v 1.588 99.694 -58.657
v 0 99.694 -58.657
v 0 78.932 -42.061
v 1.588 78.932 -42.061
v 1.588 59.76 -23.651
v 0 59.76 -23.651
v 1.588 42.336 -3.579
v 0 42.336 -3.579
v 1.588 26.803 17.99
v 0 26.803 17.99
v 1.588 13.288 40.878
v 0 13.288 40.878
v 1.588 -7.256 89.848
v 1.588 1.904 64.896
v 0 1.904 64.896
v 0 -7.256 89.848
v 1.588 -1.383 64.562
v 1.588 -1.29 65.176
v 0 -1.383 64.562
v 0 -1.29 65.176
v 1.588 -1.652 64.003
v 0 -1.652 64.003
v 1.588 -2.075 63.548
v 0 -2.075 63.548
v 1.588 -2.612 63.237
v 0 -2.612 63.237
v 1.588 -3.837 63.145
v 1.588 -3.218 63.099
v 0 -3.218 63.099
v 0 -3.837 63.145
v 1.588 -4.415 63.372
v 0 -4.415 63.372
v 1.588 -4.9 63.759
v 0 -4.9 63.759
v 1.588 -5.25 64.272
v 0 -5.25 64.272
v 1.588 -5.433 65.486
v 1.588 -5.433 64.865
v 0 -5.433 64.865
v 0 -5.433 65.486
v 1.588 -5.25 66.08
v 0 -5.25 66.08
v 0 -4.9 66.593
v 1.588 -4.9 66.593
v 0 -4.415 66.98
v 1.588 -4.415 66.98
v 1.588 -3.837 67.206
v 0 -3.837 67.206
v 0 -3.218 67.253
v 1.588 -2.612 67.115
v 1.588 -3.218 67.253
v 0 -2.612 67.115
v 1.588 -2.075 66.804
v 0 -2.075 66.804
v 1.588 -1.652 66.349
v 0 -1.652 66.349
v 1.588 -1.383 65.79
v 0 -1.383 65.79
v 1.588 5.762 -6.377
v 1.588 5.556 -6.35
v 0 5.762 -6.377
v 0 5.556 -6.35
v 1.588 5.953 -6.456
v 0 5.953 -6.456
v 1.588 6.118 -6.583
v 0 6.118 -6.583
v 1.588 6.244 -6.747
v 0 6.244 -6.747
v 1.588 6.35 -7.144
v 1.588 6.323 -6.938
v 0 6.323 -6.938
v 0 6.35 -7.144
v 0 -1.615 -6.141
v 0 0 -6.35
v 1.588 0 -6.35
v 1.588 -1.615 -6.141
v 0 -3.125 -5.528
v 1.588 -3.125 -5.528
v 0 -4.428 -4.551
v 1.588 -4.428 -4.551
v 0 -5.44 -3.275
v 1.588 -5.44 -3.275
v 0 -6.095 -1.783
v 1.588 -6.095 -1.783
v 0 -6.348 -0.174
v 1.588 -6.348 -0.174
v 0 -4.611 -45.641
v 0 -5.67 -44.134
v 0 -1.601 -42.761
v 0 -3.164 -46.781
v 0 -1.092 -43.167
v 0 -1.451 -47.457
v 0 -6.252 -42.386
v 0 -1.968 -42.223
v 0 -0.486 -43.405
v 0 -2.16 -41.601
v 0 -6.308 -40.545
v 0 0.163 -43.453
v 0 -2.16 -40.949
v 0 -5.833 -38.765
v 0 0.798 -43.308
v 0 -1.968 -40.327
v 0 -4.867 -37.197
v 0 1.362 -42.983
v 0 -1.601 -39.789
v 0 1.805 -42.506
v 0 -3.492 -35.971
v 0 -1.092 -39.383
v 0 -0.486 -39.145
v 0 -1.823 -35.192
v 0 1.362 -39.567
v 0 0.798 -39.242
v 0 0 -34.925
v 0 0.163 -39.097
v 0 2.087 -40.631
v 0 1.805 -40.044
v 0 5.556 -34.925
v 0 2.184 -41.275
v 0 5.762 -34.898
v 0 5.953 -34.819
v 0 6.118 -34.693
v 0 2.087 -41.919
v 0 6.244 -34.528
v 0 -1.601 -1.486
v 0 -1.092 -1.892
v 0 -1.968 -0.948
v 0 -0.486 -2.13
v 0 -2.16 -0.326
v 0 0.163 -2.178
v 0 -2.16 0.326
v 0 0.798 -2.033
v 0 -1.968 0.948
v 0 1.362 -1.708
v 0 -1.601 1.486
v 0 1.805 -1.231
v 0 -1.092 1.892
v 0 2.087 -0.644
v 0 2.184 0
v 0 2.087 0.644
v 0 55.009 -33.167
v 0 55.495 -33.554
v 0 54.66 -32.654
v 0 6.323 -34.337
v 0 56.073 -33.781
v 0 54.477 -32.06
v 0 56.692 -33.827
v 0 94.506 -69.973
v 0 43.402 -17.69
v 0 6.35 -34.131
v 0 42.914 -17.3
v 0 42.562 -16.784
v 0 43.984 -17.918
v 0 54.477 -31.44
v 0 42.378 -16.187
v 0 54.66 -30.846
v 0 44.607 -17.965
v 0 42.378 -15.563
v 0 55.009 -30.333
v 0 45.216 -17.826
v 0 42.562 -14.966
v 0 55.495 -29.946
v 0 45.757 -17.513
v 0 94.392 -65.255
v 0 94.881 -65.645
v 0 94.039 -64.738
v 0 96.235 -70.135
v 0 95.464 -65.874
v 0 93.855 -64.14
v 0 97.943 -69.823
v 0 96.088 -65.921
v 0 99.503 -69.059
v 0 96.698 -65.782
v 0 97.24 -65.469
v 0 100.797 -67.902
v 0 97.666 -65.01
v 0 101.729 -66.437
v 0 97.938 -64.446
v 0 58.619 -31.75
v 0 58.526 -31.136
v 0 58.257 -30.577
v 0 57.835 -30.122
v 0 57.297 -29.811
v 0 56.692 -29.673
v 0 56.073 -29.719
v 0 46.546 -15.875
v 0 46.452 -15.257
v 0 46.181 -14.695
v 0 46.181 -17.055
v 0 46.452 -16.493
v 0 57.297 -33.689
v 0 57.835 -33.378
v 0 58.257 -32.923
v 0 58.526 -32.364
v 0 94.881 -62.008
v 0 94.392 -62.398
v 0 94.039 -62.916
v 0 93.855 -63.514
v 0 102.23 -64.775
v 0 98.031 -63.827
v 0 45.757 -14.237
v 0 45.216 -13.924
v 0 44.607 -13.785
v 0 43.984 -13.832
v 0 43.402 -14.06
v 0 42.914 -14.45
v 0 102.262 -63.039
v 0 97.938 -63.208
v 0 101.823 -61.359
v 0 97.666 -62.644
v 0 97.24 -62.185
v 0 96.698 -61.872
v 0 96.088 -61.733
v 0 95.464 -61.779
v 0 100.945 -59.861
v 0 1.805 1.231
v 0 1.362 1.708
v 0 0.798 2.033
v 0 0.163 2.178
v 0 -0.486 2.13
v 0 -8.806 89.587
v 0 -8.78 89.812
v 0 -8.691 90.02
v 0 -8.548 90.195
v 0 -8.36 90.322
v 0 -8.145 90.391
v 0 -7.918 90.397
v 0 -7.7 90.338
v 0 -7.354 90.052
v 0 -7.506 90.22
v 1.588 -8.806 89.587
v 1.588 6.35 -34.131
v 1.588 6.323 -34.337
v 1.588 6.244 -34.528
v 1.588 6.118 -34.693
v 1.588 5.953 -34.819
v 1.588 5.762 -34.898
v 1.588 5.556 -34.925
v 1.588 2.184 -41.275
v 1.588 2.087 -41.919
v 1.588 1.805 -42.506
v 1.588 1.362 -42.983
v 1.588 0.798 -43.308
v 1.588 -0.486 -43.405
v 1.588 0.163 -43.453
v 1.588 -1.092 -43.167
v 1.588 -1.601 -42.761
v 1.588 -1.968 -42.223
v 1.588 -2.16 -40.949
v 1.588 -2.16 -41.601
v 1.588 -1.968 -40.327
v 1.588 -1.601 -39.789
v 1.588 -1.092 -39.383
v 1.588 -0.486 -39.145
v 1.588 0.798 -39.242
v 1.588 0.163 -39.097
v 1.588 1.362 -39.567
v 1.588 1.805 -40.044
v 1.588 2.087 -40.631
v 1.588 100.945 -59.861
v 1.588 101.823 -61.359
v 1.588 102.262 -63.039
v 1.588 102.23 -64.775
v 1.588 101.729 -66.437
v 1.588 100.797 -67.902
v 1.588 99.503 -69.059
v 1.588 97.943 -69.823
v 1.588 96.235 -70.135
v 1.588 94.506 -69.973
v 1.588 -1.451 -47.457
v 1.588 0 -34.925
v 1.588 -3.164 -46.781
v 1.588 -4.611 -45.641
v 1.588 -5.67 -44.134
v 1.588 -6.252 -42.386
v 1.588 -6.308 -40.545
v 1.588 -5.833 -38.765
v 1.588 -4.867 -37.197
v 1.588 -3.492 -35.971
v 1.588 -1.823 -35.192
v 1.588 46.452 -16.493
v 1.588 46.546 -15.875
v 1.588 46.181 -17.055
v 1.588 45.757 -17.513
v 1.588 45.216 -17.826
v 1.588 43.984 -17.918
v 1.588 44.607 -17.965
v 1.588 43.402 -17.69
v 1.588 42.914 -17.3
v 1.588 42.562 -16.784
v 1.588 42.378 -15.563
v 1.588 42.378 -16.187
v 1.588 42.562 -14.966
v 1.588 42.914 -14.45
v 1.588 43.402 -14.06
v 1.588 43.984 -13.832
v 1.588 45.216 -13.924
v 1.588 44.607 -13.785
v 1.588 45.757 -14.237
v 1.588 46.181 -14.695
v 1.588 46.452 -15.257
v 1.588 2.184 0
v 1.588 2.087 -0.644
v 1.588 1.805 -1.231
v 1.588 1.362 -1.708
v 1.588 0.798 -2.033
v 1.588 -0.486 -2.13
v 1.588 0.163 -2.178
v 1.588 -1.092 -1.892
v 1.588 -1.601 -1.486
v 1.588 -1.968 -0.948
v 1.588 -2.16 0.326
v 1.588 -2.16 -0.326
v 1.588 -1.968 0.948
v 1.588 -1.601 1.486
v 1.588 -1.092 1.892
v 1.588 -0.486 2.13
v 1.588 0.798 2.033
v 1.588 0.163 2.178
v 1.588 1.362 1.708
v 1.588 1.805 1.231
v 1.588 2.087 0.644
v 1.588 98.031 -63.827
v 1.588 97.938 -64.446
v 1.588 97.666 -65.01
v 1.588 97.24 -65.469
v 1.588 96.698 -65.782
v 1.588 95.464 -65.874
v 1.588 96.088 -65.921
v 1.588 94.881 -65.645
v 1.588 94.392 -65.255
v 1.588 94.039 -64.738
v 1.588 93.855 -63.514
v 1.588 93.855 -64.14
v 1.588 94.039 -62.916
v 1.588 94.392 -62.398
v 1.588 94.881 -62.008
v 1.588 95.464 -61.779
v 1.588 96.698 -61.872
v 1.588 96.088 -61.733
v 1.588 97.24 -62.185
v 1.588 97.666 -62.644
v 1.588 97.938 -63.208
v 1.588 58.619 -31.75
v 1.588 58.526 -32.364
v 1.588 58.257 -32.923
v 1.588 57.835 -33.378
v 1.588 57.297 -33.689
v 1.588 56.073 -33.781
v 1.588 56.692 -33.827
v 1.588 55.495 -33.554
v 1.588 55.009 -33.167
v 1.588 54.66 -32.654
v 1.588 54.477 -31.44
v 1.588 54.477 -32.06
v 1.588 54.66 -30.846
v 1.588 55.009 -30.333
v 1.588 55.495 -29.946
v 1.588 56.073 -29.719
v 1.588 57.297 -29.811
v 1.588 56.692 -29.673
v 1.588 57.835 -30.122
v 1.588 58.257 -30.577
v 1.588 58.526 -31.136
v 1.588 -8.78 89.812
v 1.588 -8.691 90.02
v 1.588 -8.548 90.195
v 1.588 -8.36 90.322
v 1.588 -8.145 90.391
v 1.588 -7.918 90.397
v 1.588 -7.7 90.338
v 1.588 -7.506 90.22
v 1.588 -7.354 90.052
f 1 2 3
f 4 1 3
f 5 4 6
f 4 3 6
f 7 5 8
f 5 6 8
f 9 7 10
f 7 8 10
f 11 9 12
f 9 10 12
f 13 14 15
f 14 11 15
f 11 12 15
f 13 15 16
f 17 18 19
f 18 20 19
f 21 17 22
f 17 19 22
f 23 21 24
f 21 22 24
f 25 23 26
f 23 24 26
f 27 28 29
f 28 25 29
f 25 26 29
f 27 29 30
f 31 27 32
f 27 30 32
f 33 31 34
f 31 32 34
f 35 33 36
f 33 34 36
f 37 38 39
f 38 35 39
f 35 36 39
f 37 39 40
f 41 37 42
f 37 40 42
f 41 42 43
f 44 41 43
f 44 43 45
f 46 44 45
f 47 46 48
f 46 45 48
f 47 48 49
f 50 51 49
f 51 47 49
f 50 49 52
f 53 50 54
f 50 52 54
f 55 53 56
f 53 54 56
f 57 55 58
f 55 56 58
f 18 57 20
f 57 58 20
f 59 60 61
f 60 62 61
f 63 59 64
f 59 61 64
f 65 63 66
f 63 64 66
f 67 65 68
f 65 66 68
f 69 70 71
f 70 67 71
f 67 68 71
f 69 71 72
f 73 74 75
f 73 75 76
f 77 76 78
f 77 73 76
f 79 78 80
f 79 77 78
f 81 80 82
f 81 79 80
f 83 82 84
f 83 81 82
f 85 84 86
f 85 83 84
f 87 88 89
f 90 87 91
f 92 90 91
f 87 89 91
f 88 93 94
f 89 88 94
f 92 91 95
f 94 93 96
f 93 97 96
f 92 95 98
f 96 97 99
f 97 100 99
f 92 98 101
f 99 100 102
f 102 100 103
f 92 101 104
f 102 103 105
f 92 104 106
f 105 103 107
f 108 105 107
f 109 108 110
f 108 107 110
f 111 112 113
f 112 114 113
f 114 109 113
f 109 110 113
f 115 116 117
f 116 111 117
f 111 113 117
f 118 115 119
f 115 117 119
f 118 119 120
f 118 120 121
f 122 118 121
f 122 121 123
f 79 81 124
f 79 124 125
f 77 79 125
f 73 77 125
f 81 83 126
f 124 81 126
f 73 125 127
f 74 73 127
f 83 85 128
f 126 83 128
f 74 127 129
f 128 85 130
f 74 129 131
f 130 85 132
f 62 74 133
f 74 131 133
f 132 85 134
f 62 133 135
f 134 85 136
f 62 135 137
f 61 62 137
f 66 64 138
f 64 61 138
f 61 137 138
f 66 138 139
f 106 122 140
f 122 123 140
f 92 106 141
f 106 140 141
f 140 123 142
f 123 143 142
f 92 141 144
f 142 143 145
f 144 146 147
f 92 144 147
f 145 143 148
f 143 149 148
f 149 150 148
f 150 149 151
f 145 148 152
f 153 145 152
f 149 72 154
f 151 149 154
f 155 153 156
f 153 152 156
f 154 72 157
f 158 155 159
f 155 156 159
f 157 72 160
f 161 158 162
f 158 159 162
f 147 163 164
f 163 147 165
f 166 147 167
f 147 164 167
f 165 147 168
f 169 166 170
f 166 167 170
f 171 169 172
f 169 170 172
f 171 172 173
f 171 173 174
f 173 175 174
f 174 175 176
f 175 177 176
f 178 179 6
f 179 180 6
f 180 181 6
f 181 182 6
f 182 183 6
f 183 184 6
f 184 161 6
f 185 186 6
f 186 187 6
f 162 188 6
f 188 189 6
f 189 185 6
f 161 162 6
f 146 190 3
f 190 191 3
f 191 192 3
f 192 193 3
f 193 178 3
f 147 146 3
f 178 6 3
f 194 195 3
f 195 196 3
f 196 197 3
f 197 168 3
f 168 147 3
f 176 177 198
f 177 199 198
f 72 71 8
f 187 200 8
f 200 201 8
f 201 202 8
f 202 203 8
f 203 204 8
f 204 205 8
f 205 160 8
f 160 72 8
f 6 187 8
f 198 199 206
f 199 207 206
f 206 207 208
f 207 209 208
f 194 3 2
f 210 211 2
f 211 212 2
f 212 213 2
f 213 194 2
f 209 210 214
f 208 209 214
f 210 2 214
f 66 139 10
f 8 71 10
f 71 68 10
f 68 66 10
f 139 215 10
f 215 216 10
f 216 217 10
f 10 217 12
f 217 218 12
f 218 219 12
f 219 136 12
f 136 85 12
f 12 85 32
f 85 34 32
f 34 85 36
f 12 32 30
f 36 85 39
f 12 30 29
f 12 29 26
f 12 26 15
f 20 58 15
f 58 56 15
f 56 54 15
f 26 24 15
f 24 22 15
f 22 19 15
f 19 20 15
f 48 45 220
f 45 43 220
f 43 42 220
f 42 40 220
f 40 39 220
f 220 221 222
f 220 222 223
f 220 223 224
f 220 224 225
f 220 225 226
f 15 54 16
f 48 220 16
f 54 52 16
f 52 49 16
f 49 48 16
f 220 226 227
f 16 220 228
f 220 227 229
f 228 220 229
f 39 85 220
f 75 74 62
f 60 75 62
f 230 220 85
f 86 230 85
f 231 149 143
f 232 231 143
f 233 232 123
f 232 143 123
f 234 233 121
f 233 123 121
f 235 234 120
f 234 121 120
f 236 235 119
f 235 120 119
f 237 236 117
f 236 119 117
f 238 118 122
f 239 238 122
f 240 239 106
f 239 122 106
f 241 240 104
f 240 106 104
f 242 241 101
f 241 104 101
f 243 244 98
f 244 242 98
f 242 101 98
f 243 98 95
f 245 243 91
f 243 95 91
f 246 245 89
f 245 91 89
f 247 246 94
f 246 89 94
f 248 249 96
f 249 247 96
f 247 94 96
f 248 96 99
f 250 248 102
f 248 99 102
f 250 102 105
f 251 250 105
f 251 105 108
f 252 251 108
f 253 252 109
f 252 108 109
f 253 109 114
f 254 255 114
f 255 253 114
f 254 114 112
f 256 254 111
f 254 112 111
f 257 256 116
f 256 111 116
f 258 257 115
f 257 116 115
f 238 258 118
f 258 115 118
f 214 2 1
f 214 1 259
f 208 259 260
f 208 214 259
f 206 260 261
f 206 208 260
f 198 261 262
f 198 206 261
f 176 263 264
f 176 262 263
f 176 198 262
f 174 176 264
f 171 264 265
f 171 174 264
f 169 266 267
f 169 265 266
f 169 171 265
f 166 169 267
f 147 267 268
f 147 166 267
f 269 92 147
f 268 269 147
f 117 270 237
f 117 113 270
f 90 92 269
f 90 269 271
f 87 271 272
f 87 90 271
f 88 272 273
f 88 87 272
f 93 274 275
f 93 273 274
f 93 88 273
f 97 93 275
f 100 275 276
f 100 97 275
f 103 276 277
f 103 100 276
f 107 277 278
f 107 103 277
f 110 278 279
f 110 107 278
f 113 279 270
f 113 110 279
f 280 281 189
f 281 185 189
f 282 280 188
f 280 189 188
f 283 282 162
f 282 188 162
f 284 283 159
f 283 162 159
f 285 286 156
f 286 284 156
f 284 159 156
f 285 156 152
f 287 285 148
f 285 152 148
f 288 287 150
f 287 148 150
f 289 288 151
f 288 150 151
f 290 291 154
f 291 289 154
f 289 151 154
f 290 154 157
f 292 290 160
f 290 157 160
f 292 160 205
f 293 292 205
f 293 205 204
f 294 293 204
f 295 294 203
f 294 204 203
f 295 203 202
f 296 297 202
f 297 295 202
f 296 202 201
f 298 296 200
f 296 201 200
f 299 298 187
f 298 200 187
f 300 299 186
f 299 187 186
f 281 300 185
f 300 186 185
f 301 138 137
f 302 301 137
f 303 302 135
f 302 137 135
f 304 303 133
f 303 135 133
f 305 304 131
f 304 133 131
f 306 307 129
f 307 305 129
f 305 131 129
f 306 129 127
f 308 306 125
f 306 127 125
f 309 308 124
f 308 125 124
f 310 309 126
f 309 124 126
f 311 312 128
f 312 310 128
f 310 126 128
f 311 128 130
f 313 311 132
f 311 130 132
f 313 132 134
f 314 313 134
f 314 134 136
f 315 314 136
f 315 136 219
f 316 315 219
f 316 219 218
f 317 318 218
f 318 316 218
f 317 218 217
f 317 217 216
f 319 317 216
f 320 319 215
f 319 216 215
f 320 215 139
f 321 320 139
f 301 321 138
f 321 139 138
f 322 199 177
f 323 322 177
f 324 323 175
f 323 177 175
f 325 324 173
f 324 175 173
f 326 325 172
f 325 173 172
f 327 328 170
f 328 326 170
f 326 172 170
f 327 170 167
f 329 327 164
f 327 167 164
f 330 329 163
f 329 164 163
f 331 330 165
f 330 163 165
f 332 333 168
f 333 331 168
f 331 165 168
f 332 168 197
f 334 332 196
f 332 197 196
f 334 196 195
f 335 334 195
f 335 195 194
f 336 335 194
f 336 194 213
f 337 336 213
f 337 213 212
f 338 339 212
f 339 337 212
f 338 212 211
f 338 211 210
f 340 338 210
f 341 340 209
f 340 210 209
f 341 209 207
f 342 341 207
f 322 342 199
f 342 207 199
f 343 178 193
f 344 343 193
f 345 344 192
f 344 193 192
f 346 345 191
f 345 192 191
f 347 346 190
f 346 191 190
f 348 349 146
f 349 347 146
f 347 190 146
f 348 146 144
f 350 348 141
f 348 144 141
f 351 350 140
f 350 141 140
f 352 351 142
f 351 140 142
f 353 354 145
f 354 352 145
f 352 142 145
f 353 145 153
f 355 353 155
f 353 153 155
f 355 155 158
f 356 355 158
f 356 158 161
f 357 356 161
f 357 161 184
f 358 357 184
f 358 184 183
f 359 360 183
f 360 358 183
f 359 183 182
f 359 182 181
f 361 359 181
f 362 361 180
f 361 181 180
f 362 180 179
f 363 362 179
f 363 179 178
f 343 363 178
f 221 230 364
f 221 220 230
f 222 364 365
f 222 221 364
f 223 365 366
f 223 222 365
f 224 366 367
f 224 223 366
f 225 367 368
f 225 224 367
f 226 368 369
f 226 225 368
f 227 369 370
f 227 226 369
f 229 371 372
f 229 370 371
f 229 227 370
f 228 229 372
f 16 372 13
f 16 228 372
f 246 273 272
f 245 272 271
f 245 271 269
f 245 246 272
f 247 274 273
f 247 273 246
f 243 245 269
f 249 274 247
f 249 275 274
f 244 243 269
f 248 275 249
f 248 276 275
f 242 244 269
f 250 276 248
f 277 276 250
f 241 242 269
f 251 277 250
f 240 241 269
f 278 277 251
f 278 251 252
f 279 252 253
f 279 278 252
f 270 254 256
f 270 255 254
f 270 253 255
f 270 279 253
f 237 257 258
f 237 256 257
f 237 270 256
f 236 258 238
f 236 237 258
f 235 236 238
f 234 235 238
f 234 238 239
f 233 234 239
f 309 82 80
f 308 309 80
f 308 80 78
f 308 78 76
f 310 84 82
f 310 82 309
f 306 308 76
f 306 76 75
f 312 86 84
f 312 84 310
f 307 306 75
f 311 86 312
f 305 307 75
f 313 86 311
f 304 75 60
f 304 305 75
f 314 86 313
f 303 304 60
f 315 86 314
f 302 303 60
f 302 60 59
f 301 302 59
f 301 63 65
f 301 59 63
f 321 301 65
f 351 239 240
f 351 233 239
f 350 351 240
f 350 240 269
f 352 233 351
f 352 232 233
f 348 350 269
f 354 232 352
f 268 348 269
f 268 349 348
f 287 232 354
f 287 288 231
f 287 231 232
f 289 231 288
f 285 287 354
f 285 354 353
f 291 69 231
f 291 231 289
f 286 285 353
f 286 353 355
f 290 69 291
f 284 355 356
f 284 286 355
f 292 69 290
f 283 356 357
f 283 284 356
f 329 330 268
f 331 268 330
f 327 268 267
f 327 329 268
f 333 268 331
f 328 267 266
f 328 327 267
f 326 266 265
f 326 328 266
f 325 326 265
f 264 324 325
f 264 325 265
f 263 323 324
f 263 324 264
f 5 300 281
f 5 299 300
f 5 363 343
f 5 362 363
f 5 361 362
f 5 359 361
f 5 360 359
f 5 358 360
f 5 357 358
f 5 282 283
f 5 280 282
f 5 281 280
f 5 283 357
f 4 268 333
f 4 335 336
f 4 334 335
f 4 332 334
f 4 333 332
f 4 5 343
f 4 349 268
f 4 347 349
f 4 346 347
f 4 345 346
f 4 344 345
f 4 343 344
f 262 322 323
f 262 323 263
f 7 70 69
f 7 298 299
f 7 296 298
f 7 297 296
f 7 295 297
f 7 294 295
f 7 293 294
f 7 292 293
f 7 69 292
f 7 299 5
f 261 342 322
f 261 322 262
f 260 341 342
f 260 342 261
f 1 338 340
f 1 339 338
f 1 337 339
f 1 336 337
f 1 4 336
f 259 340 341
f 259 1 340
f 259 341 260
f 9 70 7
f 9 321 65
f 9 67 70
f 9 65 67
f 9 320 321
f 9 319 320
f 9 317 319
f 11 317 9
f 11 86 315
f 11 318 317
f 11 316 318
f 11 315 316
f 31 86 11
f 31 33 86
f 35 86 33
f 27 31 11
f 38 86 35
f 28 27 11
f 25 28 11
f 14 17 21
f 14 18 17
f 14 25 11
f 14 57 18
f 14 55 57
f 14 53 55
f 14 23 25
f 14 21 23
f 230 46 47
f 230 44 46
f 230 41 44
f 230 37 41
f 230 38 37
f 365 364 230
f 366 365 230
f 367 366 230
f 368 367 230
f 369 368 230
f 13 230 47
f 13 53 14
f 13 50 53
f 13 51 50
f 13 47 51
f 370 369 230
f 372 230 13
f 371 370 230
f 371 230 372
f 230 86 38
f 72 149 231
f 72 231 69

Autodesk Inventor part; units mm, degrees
ref_plane "YZ Plane" through (0, 0, 0) normal (1, 0, 0) x (0, 1, 0)
ref_plane "XZ Plane" through (0, 0, 0) normal (0, 1, 0) x (-1, 0, 0)
ref_plane "XY Plane" through (0, 0, 0) normal (0, 0, 1) x (1, 0, 0)
sketch "main" plane through (0, 0, 0) normal (0, 0, 1) x (1, 0, 0)
  circle A0 centre (-191.7635, 49.9495) radius 2.1844
  circle A1 centre (-95.8324, -13.8772) radius 2.1
  arc A2 (-99.5462, -18.9735) -> (-92.0695, -8.7075) centre (-95.8064, -13.8415) ccw
  arc A3 (-198.1111, 49.7757) -> (-191.7635, 43.5995) centre (-191.7635, 49.9495) ccw
  line L0 (-200.5697, 139.5363) -> (-198.1111, 49.7757)
  arc A4 (-199.0195, 139.7975) -> (-92.0695, -8.7075) centre (80.274, 228.1743) ccw
  circle A5 centre (-195.1368, 115.1254) radius 2.0828
  line L1 (-191.7635, 43.5995) -> (-186.2072, 43.5995)
  arc A6 (-199.0195, 139.7975) -> (-200.5697, 139.5363) centre (-199.7762, 139.5581) ccw
  circle A7 centre (-135.2274, 18.1995) radius 2.0828
  circle A8 centre (-191.7635, 8.6745) radius 2.1844
  arc A9 (-191.7635, 15.0245) -> (-193.2141, 2.4924) centre (-191.7635, 8.6745) ccw
  line L2 (-185.4135, 15.8183) -> (-185.4135, 42.8058)
  line L3 (-191.7635, 15.0245) -> (-186.2072, 15.0245)
  arc A10 (-185.4135, 42.8058) -> (-186.2072, 43.5995) centre (-186.2072, 42.8058) ccw
  arc A11 (-186.2072, 15.0245) -> (-185.4135, 15.8183) centre (-186.2072, 15.8183) ccw
  line L4 (-193.2141, 2.4924) -> (-97.2571, -20.0236)
  point P0 (1.1251, 9.7944)
  point P1 (-200.7302, 145.398)
  dimension "d7" = 12.7
  dimension "d8" = 4.1656
  dimension "d9" = 6.35
  dimension "d11" = 0.7937
  dimension "d13" = 4.1656
  dimension "d15" = 12.7
  dimension "d16" = 0.7937
sketch "Sketch1" plane through (0, 0, 0) normal (1, 0, 0) x (0, 1, 0)
  circle A0 centre (44.45, -15.875) radius 2.0955
  circle A1 centre (0, 0) radius 2.1844
  circle A2 centre (95.9311, -63.8268) radius 2.1
  arc A3 (92.2173, -68.923) -> (99.694, -58.6571) centre (95.9571, -63.7911) ccw
  arc A4 (-6.3476, -0.1739) -> (0, -6.35) centre (0, 0) ccw
  line L0 (-8.8062, 89.5868) -> (-6.3476, -0.1739)
  arc A5 (-7.256, 89.848) -> (99.694, -58.6571) centre (272.0375, 178.2247) ccw
  circle A6 centre (-3.3733, 65.1759) radius 2.0828
  line L1 (0, -6.35) -> (5.5563, -6.35)
  arc A7 (-7.256, 89.848) -> (-8.8062, 89.5868) centre (-8.0127, 89.6085) ccw
  circle A8 centre (56.5361, -31.75) radius 2.0828
  circle A9 centre (0, -41.275) radius 2.1844
  arc A10 (0, -34.925) -> (-1.4506, -47.4571) centre (0, -41.275) ccw
  line L2 (6.35, -34.1313) -> (6.35, -7.1438)
  line L3 (0, -34.925) -> (5.5563, -34.925)
  arc A11 (6.35, -7.1438) -> (5.5563, -6.35) centre (5.5563, -7.1437) ccw
  arc A12 (5.5563, -34.925) -> (6.35, -34.1313) centre (5.5563, -34.1313) ccw
  line L4 (-1.4506, -47.4571) -> (94.5064, -69.9732)
  dimension "d18" = 4.191
extrude "Extrusion1" add sketch "Sketch1" along normal blind 1.5875
equation "\"BendRadius\" = Thickness"
equation "\"BendReliefWidth\" = Thickness"
equation "\"BendReliefDepth\" = 0.5 * Thickness"
equation "\"CornerReliefSize\" = 4 * Thickness"
equation "\"MinimumRemnant\" = 2 * Thickness"
equation "\"TransitionRadius\" = BendRadius"
equation "\"JacobiRadiusSize\" = BendRadius"
equation "\"GapSize\" = Thickness"
equation "\"Thickness\" = 1.5875"
properties part number "ramp" material "Acetal Resin, White"
